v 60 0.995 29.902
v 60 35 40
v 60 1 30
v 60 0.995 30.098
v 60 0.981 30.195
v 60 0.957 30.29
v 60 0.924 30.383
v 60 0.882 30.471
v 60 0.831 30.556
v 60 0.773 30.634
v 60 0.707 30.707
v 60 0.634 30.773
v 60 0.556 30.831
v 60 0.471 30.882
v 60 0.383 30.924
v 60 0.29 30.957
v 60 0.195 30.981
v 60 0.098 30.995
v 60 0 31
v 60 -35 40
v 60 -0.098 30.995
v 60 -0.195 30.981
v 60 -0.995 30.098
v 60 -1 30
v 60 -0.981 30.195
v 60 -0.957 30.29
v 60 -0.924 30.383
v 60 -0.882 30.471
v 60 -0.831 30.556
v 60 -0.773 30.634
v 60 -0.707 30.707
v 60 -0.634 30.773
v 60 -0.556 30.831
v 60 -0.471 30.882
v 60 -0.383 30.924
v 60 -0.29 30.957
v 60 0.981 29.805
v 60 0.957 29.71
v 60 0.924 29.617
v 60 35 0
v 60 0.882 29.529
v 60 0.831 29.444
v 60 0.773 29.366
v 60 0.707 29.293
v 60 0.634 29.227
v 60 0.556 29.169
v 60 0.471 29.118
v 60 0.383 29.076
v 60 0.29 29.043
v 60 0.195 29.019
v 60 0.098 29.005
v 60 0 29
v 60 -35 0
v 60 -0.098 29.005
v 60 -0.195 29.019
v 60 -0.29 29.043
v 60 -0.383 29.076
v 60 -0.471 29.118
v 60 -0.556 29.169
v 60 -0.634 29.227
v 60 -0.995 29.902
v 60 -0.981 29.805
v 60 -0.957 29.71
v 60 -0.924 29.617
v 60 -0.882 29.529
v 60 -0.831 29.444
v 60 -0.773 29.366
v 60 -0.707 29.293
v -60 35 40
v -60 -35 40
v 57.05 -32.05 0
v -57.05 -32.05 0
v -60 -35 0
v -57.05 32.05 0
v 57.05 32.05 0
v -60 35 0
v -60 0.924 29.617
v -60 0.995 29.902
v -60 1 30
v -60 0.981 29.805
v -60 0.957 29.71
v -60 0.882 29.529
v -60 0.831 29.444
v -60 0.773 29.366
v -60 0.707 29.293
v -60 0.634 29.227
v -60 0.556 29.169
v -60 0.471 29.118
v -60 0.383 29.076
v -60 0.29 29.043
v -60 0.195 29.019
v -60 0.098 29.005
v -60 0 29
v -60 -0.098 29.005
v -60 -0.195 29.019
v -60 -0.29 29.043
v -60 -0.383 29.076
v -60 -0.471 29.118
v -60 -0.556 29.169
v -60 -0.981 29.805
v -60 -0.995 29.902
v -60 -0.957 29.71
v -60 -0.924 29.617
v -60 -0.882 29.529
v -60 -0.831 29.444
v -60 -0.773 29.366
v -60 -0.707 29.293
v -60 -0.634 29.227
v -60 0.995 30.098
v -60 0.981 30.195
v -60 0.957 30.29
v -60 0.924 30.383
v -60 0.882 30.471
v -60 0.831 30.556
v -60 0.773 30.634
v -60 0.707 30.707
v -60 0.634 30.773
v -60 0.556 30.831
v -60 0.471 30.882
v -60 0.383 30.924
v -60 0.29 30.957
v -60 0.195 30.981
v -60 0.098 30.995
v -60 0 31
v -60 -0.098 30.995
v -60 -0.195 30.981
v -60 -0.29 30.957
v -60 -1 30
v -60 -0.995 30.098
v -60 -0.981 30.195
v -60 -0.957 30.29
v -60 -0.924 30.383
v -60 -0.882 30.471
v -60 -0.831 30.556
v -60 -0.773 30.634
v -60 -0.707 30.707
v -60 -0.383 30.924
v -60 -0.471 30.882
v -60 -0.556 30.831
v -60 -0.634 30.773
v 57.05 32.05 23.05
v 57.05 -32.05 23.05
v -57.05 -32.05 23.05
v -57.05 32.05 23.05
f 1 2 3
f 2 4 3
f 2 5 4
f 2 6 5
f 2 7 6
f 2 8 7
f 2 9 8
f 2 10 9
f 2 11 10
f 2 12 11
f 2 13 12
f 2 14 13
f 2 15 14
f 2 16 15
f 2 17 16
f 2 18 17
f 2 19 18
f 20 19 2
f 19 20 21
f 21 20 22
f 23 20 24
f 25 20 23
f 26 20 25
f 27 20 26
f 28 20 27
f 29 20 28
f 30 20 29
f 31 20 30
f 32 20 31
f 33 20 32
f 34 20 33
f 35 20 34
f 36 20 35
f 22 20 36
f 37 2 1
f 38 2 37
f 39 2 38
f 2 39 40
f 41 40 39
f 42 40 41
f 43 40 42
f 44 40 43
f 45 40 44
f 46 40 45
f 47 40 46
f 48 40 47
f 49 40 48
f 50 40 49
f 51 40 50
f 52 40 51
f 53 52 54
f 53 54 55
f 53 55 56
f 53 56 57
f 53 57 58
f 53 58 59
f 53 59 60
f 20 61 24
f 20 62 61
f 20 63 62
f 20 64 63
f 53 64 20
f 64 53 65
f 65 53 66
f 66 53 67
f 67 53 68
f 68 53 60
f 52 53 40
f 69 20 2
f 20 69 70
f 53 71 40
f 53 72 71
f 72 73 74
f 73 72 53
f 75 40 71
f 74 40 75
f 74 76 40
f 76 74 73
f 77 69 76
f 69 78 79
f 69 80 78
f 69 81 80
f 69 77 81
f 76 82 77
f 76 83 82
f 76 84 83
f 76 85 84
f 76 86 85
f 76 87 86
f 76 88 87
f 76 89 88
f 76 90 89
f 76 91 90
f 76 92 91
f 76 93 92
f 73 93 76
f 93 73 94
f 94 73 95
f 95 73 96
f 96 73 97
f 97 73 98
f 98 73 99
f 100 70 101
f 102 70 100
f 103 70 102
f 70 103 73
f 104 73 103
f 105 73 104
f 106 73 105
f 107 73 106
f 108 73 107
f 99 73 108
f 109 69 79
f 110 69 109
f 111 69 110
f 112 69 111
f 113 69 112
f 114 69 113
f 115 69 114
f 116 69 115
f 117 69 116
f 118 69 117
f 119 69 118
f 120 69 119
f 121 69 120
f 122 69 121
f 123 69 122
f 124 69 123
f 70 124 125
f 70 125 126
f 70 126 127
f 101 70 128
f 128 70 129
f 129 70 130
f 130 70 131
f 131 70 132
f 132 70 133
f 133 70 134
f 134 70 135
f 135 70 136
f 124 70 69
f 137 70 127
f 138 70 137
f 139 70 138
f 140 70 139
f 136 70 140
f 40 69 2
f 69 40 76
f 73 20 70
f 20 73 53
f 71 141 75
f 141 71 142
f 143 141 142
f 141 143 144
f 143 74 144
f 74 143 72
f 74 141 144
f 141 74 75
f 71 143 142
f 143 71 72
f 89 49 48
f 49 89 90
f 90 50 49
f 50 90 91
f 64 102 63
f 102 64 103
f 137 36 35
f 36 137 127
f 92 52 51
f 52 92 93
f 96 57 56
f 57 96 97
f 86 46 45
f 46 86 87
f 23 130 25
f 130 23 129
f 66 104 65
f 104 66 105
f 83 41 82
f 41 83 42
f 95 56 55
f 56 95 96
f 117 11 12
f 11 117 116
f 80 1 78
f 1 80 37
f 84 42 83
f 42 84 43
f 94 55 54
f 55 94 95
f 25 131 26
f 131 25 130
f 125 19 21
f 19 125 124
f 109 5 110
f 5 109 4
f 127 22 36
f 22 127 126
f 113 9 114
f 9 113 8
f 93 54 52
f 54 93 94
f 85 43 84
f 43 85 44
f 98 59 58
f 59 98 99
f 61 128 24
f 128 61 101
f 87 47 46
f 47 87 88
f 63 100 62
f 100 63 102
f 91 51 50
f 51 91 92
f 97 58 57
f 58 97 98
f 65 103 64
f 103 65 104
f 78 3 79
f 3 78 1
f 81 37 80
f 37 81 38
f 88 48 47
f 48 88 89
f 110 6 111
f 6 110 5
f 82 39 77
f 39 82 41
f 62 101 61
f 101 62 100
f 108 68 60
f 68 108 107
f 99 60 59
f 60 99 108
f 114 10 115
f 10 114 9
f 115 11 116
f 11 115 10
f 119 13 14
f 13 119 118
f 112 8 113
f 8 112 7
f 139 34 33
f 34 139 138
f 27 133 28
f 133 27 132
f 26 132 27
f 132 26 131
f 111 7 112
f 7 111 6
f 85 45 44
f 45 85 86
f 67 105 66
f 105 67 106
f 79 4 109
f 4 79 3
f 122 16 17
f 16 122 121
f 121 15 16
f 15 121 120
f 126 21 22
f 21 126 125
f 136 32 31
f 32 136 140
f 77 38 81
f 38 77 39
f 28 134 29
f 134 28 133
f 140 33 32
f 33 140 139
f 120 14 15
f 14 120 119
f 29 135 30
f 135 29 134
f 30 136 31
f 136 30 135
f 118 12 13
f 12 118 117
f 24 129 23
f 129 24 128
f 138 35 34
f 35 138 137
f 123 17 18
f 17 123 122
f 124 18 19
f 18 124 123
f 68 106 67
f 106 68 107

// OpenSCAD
// --- Dimensions (mm) ---
outer_x = 120;          // Total length of the tank
outer_y = 70;           // Total width of the tank
outer_z = 40;           // Total height of the tank

wall_thickness = 3;     // Thickness of the walls and floor
floor_thickness = 3;    // Thickness of the floor

platform_length = 60;   // Length of the central platform (X direction)
platform_height = 13;   // Height of the platform top from the inner floor
platform_width = outer_y - (2 * wall_thickness); // Spans full inner width

hole_diameter = 2;      // Diameter of electrode wire holes
hole_y_pos = 0;         // Y position of holes (centered on Y axis)
hole_z_pos = 30;        // Z position of holes (measured from the bottom of the tank)

// --- Resolution ---
$fn = 64;

// --- Model Construction ---
// The user requested the part rests on the XY plane at z = 0.
// The bounding box report showed the part was centered at Z=0 (from -20 to 20).
// We must translate the entire assembly so the lowest point (bottom of floor) is at Z=0.

module tank_geometry() {
    difference() {
        // 1. The Solid Body (Outer shell + Internal Platform)
        union() {
            // The main outer block
            cube([outer_x, outer_y, outer_z], center = true);

            // The Platform
            // Platform top is 13mm above the inner floor.
            // Inner floor is at Z = -outer_z/2 + floor_thickness.
            // Platform top is at Z = -outer_z/2 + floor_thickness + platform_height.
            // The platform block itself has height 'platform_height'.
            // To make the top of the platform reach the target height, 
            // we center the platform cube such that its top face is at the target Z.
            translate([0, 0, (-outer_z/2 + floor_thickness + platform_height/2)])
                cube([platform_length, platform_width, platform_height], center = true);
        }

        // 2. The Inner Cavity
        // Subtract the void to create the tank.
        // We extend the subtraction in Z to ensure the top is open.
        translate([0, 0, -outer_z/2 + floor_thickness])
            cube([outer_x - 2*wall_thickness + 0.1, outer_y - 2*wall_thickness + 0.1, outer_z + 0.1], center = true);

        // 3. The Electrode Holes
        // Holes are at Z = 30 from the bottom.
        // Bottom is at Z = -outer_z/2.
        // Hole Z coordinate = -outer_z/2 + hole_z_pos.
        translate([0, hole_y_pos, -outer_z/2 + hole_z_pos])
            rotate([0, 90, 0])
                cylinder(d = hole_diameter, h = outer_x + 2, center = true);
    }
}

// Final Assembly:
// Move the part so it rests on the XY plane at Z = 0.
// The lowest point of the current geometry is -outer_z/2.
// Therefore, we translate by +outer_z/2.
translate([0, 0, outer_z/2])
    tank_geometry();

// --- Verification of logic ---
// 1. Dimensions: 120x70x40. Correct.
// 2. Walls/Floor: 3mm. Correct.
// 3. Platform: 60mm long, spans inner width, top is 13mm above inner floor. Correct.
// 4. Holes: 2mm diameter, at Y=0, Z=30 (from bottom). Correct.
// 5. Orientation: Rests on XY plane at Z=0. Correct.
